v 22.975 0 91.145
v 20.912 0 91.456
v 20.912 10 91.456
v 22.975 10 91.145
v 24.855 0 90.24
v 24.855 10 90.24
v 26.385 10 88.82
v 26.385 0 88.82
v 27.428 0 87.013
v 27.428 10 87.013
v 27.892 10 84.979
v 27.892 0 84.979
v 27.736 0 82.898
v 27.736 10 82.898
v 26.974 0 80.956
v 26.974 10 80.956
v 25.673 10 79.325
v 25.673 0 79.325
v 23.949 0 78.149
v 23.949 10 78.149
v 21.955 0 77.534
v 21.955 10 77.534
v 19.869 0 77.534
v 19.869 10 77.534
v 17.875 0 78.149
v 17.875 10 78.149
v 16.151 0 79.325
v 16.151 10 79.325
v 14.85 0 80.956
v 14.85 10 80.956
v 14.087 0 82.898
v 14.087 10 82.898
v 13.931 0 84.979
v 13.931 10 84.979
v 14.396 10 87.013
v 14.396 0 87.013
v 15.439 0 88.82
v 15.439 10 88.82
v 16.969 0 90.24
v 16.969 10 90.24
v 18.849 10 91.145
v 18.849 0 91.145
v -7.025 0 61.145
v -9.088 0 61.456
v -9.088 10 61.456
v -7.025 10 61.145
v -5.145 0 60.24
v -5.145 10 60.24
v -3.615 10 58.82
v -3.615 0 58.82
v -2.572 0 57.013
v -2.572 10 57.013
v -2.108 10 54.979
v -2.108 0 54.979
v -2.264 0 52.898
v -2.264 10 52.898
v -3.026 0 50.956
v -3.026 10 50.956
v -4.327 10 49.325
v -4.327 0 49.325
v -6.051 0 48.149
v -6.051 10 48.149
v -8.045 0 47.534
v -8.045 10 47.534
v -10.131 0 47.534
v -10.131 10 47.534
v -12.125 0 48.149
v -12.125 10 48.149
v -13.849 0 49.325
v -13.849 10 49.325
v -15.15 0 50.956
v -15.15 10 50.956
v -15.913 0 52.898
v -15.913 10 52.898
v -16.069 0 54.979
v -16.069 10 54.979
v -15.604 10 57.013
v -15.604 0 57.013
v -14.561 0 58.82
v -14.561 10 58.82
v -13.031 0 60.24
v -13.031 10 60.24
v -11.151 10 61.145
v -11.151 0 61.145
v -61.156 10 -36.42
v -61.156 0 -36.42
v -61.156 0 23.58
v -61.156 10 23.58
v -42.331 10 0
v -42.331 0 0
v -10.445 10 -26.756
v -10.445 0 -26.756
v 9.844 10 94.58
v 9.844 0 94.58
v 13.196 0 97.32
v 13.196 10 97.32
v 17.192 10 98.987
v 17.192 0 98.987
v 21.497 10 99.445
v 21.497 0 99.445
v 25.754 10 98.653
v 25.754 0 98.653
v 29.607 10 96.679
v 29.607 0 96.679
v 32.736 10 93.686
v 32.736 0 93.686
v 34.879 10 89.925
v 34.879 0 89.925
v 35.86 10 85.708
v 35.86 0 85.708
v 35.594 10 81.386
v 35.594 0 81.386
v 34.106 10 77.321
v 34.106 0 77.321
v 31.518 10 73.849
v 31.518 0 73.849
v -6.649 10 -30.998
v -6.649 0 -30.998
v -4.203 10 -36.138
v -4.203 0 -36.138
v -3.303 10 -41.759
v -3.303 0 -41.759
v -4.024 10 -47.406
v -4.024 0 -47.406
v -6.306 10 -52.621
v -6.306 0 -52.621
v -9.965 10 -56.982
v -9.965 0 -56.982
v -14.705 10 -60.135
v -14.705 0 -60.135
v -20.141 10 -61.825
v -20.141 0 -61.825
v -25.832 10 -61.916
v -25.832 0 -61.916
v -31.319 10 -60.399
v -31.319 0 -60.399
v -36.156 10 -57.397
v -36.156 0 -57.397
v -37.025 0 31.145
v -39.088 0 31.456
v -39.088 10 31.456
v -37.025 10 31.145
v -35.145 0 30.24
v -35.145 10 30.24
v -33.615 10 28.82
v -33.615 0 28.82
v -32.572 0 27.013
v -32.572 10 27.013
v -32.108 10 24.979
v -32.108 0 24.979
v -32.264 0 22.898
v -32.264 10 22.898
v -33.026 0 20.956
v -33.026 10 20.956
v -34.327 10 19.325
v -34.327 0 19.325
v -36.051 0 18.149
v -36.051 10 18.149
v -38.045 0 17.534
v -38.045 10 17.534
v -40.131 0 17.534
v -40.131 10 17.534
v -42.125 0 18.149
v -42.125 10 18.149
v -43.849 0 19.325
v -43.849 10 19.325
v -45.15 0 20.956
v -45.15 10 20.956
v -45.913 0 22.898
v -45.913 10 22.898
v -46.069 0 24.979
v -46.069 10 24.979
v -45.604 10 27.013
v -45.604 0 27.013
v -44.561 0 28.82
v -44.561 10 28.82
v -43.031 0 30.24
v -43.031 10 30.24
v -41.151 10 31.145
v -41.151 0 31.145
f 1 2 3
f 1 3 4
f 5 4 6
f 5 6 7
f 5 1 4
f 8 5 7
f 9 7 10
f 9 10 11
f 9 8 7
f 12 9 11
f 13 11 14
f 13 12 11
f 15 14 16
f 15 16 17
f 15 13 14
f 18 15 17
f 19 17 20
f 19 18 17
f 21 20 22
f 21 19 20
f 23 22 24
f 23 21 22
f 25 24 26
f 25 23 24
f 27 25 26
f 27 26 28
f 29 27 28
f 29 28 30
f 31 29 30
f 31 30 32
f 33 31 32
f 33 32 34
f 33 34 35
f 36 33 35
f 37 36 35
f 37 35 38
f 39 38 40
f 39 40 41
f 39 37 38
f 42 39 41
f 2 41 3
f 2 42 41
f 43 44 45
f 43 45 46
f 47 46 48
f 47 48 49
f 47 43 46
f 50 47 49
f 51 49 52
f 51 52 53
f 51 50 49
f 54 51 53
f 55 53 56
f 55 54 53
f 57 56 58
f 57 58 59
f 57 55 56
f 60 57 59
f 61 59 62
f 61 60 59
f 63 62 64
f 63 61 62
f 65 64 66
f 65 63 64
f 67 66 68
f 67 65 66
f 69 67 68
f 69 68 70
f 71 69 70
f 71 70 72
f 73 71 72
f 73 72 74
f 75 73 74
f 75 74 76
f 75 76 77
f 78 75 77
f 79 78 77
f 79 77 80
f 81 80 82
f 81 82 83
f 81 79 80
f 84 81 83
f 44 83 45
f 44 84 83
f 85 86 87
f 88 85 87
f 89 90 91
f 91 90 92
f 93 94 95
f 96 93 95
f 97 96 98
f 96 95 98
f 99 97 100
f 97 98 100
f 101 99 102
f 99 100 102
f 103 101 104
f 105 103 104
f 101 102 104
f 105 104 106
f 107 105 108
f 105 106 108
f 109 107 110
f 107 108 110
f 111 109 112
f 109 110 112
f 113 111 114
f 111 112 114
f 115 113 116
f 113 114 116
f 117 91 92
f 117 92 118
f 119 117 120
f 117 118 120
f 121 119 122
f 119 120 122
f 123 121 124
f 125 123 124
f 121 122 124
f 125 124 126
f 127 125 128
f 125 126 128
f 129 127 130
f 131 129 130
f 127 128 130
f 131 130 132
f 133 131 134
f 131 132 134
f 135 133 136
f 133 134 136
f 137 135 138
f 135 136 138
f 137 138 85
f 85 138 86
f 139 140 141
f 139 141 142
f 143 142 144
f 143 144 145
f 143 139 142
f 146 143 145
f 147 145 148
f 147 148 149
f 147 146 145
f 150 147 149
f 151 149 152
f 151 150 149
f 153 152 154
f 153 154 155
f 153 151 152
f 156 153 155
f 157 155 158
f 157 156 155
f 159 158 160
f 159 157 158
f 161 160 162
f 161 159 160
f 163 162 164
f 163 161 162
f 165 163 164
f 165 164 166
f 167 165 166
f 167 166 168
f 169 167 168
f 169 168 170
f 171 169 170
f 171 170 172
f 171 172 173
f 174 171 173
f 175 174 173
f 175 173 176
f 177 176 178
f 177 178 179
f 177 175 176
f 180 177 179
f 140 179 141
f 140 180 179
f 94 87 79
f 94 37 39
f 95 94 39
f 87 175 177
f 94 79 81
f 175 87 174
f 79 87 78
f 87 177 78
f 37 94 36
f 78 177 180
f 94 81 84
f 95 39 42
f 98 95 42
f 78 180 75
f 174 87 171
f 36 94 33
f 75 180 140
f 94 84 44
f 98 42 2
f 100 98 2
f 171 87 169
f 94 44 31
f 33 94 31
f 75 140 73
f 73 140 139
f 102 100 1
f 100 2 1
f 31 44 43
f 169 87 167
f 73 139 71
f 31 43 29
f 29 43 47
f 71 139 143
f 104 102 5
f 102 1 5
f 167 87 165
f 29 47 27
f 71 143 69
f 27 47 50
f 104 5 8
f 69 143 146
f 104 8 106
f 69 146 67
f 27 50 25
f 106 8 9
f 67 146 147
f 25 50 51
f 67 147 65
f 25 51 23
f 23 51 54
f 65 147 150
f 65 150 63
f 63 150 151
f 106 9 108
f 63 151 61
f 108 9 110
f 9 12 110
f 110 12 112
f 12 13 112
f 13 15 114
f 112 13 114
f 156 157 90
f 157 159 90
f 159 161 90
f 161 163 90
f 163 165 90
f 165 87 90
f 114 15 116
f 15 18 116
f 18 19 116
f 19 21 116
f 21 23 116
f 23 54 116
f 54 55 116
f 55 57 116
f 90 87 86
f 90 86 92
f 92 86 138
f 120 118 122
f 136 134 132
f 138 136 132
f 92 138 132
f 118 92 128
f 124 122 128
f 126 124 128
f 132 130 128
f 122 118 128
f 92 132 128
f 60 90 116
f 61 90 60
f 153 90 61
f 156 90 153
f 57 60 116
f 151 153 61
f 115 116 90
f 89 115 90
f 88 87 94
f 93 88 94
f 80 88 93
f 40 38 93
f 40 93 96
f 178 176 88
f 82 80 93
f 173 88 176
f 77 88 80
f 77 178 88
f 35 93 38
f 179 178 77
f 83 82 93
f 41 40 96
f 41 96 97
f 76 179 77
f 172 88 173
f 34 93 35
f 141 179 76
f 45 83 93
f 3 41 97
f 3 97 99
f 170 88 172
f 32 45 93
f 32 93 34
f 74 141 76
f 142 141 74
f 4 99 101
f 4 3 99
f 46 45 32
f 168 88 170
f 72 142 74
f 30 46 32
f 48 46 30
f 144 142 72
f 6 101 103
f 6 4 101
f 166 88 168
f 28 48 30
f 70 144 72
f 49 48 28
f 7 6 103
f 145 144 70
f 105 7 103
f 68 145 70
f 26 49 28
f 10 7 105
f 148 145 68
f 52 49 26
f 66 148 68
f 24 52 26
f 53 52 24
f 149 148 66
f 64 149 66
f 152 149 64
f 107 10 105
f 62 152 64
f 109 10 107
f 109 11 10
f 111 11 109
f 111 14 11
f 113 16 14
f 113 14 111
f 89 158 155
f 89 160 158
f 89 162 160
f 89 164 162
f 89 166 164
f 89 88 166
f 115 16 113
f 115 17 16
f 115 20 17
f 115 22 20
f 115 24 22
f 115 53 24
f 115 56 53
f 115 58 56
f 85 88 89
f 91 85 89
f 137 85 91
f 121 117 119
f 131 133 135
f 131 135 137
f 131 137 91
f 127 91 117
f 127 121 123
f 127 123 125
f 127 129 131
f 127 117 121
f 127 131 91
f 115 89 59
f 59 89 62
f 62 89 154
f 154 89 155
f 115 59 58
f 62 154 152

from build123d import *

# Parameters (mm, degrees)
SKETCH1_R           = 7
BOSS_EXTRUDE1_DEPTH = 10


with BuildPart() as part:
    # Sketch1 → Boss-Extrude1 (new body)
    with BuildSketch(Plane(origin=(0, 0, 0), x_dir=(1, 0, 0), z_dir=(0, 1, 0))):
        with BuildLine():
            Line((-42.331013445, 0), (-10.444849334, 26.755668546))
            ThreePointArc((-10.444849334, 26.755668546), (-7.979712665, 54.932309602), (-36.156353721, 57.39744627))
            Line((-36.156353721, 57.39744627), (-61.156353721, 36.419955491))
            Line((-61.156353721, 36.419955491), (-61.156353721, -23.580044509))
            Line((-61.156353721, -23.580044509), (9.843646279, -94.580044509))
            ThreePointArc((9.843646279, -94.580044509), (31.279693612, -95.296110549), (31.518421727, -73.849435172))
            Line((31.518421727, -73.849435172), (-42.331013445, 0))
        make_face()
        with Locations(Location((20.911820009, -84.456036889, 0), (0, 0, 270))):
            Circle(SKETCH1_R, mode=Mode.SUBTRACT)
        with Locations(Location((-9.088179991, -54.456036889, 0), (0, 0, 270))):
            Circle(SKETCH1_R, mode=Mode.SUBTRACT)
        with Locations(Location((-39.088179991, -24.456036889, 0), (0, 0, 270))):
            Circle(SKETCH1_R, mode=Mode.SUBTRACT)
    extrude(amount=BOSS_EXTRUDE1_DEPTH)


solid = part.part
